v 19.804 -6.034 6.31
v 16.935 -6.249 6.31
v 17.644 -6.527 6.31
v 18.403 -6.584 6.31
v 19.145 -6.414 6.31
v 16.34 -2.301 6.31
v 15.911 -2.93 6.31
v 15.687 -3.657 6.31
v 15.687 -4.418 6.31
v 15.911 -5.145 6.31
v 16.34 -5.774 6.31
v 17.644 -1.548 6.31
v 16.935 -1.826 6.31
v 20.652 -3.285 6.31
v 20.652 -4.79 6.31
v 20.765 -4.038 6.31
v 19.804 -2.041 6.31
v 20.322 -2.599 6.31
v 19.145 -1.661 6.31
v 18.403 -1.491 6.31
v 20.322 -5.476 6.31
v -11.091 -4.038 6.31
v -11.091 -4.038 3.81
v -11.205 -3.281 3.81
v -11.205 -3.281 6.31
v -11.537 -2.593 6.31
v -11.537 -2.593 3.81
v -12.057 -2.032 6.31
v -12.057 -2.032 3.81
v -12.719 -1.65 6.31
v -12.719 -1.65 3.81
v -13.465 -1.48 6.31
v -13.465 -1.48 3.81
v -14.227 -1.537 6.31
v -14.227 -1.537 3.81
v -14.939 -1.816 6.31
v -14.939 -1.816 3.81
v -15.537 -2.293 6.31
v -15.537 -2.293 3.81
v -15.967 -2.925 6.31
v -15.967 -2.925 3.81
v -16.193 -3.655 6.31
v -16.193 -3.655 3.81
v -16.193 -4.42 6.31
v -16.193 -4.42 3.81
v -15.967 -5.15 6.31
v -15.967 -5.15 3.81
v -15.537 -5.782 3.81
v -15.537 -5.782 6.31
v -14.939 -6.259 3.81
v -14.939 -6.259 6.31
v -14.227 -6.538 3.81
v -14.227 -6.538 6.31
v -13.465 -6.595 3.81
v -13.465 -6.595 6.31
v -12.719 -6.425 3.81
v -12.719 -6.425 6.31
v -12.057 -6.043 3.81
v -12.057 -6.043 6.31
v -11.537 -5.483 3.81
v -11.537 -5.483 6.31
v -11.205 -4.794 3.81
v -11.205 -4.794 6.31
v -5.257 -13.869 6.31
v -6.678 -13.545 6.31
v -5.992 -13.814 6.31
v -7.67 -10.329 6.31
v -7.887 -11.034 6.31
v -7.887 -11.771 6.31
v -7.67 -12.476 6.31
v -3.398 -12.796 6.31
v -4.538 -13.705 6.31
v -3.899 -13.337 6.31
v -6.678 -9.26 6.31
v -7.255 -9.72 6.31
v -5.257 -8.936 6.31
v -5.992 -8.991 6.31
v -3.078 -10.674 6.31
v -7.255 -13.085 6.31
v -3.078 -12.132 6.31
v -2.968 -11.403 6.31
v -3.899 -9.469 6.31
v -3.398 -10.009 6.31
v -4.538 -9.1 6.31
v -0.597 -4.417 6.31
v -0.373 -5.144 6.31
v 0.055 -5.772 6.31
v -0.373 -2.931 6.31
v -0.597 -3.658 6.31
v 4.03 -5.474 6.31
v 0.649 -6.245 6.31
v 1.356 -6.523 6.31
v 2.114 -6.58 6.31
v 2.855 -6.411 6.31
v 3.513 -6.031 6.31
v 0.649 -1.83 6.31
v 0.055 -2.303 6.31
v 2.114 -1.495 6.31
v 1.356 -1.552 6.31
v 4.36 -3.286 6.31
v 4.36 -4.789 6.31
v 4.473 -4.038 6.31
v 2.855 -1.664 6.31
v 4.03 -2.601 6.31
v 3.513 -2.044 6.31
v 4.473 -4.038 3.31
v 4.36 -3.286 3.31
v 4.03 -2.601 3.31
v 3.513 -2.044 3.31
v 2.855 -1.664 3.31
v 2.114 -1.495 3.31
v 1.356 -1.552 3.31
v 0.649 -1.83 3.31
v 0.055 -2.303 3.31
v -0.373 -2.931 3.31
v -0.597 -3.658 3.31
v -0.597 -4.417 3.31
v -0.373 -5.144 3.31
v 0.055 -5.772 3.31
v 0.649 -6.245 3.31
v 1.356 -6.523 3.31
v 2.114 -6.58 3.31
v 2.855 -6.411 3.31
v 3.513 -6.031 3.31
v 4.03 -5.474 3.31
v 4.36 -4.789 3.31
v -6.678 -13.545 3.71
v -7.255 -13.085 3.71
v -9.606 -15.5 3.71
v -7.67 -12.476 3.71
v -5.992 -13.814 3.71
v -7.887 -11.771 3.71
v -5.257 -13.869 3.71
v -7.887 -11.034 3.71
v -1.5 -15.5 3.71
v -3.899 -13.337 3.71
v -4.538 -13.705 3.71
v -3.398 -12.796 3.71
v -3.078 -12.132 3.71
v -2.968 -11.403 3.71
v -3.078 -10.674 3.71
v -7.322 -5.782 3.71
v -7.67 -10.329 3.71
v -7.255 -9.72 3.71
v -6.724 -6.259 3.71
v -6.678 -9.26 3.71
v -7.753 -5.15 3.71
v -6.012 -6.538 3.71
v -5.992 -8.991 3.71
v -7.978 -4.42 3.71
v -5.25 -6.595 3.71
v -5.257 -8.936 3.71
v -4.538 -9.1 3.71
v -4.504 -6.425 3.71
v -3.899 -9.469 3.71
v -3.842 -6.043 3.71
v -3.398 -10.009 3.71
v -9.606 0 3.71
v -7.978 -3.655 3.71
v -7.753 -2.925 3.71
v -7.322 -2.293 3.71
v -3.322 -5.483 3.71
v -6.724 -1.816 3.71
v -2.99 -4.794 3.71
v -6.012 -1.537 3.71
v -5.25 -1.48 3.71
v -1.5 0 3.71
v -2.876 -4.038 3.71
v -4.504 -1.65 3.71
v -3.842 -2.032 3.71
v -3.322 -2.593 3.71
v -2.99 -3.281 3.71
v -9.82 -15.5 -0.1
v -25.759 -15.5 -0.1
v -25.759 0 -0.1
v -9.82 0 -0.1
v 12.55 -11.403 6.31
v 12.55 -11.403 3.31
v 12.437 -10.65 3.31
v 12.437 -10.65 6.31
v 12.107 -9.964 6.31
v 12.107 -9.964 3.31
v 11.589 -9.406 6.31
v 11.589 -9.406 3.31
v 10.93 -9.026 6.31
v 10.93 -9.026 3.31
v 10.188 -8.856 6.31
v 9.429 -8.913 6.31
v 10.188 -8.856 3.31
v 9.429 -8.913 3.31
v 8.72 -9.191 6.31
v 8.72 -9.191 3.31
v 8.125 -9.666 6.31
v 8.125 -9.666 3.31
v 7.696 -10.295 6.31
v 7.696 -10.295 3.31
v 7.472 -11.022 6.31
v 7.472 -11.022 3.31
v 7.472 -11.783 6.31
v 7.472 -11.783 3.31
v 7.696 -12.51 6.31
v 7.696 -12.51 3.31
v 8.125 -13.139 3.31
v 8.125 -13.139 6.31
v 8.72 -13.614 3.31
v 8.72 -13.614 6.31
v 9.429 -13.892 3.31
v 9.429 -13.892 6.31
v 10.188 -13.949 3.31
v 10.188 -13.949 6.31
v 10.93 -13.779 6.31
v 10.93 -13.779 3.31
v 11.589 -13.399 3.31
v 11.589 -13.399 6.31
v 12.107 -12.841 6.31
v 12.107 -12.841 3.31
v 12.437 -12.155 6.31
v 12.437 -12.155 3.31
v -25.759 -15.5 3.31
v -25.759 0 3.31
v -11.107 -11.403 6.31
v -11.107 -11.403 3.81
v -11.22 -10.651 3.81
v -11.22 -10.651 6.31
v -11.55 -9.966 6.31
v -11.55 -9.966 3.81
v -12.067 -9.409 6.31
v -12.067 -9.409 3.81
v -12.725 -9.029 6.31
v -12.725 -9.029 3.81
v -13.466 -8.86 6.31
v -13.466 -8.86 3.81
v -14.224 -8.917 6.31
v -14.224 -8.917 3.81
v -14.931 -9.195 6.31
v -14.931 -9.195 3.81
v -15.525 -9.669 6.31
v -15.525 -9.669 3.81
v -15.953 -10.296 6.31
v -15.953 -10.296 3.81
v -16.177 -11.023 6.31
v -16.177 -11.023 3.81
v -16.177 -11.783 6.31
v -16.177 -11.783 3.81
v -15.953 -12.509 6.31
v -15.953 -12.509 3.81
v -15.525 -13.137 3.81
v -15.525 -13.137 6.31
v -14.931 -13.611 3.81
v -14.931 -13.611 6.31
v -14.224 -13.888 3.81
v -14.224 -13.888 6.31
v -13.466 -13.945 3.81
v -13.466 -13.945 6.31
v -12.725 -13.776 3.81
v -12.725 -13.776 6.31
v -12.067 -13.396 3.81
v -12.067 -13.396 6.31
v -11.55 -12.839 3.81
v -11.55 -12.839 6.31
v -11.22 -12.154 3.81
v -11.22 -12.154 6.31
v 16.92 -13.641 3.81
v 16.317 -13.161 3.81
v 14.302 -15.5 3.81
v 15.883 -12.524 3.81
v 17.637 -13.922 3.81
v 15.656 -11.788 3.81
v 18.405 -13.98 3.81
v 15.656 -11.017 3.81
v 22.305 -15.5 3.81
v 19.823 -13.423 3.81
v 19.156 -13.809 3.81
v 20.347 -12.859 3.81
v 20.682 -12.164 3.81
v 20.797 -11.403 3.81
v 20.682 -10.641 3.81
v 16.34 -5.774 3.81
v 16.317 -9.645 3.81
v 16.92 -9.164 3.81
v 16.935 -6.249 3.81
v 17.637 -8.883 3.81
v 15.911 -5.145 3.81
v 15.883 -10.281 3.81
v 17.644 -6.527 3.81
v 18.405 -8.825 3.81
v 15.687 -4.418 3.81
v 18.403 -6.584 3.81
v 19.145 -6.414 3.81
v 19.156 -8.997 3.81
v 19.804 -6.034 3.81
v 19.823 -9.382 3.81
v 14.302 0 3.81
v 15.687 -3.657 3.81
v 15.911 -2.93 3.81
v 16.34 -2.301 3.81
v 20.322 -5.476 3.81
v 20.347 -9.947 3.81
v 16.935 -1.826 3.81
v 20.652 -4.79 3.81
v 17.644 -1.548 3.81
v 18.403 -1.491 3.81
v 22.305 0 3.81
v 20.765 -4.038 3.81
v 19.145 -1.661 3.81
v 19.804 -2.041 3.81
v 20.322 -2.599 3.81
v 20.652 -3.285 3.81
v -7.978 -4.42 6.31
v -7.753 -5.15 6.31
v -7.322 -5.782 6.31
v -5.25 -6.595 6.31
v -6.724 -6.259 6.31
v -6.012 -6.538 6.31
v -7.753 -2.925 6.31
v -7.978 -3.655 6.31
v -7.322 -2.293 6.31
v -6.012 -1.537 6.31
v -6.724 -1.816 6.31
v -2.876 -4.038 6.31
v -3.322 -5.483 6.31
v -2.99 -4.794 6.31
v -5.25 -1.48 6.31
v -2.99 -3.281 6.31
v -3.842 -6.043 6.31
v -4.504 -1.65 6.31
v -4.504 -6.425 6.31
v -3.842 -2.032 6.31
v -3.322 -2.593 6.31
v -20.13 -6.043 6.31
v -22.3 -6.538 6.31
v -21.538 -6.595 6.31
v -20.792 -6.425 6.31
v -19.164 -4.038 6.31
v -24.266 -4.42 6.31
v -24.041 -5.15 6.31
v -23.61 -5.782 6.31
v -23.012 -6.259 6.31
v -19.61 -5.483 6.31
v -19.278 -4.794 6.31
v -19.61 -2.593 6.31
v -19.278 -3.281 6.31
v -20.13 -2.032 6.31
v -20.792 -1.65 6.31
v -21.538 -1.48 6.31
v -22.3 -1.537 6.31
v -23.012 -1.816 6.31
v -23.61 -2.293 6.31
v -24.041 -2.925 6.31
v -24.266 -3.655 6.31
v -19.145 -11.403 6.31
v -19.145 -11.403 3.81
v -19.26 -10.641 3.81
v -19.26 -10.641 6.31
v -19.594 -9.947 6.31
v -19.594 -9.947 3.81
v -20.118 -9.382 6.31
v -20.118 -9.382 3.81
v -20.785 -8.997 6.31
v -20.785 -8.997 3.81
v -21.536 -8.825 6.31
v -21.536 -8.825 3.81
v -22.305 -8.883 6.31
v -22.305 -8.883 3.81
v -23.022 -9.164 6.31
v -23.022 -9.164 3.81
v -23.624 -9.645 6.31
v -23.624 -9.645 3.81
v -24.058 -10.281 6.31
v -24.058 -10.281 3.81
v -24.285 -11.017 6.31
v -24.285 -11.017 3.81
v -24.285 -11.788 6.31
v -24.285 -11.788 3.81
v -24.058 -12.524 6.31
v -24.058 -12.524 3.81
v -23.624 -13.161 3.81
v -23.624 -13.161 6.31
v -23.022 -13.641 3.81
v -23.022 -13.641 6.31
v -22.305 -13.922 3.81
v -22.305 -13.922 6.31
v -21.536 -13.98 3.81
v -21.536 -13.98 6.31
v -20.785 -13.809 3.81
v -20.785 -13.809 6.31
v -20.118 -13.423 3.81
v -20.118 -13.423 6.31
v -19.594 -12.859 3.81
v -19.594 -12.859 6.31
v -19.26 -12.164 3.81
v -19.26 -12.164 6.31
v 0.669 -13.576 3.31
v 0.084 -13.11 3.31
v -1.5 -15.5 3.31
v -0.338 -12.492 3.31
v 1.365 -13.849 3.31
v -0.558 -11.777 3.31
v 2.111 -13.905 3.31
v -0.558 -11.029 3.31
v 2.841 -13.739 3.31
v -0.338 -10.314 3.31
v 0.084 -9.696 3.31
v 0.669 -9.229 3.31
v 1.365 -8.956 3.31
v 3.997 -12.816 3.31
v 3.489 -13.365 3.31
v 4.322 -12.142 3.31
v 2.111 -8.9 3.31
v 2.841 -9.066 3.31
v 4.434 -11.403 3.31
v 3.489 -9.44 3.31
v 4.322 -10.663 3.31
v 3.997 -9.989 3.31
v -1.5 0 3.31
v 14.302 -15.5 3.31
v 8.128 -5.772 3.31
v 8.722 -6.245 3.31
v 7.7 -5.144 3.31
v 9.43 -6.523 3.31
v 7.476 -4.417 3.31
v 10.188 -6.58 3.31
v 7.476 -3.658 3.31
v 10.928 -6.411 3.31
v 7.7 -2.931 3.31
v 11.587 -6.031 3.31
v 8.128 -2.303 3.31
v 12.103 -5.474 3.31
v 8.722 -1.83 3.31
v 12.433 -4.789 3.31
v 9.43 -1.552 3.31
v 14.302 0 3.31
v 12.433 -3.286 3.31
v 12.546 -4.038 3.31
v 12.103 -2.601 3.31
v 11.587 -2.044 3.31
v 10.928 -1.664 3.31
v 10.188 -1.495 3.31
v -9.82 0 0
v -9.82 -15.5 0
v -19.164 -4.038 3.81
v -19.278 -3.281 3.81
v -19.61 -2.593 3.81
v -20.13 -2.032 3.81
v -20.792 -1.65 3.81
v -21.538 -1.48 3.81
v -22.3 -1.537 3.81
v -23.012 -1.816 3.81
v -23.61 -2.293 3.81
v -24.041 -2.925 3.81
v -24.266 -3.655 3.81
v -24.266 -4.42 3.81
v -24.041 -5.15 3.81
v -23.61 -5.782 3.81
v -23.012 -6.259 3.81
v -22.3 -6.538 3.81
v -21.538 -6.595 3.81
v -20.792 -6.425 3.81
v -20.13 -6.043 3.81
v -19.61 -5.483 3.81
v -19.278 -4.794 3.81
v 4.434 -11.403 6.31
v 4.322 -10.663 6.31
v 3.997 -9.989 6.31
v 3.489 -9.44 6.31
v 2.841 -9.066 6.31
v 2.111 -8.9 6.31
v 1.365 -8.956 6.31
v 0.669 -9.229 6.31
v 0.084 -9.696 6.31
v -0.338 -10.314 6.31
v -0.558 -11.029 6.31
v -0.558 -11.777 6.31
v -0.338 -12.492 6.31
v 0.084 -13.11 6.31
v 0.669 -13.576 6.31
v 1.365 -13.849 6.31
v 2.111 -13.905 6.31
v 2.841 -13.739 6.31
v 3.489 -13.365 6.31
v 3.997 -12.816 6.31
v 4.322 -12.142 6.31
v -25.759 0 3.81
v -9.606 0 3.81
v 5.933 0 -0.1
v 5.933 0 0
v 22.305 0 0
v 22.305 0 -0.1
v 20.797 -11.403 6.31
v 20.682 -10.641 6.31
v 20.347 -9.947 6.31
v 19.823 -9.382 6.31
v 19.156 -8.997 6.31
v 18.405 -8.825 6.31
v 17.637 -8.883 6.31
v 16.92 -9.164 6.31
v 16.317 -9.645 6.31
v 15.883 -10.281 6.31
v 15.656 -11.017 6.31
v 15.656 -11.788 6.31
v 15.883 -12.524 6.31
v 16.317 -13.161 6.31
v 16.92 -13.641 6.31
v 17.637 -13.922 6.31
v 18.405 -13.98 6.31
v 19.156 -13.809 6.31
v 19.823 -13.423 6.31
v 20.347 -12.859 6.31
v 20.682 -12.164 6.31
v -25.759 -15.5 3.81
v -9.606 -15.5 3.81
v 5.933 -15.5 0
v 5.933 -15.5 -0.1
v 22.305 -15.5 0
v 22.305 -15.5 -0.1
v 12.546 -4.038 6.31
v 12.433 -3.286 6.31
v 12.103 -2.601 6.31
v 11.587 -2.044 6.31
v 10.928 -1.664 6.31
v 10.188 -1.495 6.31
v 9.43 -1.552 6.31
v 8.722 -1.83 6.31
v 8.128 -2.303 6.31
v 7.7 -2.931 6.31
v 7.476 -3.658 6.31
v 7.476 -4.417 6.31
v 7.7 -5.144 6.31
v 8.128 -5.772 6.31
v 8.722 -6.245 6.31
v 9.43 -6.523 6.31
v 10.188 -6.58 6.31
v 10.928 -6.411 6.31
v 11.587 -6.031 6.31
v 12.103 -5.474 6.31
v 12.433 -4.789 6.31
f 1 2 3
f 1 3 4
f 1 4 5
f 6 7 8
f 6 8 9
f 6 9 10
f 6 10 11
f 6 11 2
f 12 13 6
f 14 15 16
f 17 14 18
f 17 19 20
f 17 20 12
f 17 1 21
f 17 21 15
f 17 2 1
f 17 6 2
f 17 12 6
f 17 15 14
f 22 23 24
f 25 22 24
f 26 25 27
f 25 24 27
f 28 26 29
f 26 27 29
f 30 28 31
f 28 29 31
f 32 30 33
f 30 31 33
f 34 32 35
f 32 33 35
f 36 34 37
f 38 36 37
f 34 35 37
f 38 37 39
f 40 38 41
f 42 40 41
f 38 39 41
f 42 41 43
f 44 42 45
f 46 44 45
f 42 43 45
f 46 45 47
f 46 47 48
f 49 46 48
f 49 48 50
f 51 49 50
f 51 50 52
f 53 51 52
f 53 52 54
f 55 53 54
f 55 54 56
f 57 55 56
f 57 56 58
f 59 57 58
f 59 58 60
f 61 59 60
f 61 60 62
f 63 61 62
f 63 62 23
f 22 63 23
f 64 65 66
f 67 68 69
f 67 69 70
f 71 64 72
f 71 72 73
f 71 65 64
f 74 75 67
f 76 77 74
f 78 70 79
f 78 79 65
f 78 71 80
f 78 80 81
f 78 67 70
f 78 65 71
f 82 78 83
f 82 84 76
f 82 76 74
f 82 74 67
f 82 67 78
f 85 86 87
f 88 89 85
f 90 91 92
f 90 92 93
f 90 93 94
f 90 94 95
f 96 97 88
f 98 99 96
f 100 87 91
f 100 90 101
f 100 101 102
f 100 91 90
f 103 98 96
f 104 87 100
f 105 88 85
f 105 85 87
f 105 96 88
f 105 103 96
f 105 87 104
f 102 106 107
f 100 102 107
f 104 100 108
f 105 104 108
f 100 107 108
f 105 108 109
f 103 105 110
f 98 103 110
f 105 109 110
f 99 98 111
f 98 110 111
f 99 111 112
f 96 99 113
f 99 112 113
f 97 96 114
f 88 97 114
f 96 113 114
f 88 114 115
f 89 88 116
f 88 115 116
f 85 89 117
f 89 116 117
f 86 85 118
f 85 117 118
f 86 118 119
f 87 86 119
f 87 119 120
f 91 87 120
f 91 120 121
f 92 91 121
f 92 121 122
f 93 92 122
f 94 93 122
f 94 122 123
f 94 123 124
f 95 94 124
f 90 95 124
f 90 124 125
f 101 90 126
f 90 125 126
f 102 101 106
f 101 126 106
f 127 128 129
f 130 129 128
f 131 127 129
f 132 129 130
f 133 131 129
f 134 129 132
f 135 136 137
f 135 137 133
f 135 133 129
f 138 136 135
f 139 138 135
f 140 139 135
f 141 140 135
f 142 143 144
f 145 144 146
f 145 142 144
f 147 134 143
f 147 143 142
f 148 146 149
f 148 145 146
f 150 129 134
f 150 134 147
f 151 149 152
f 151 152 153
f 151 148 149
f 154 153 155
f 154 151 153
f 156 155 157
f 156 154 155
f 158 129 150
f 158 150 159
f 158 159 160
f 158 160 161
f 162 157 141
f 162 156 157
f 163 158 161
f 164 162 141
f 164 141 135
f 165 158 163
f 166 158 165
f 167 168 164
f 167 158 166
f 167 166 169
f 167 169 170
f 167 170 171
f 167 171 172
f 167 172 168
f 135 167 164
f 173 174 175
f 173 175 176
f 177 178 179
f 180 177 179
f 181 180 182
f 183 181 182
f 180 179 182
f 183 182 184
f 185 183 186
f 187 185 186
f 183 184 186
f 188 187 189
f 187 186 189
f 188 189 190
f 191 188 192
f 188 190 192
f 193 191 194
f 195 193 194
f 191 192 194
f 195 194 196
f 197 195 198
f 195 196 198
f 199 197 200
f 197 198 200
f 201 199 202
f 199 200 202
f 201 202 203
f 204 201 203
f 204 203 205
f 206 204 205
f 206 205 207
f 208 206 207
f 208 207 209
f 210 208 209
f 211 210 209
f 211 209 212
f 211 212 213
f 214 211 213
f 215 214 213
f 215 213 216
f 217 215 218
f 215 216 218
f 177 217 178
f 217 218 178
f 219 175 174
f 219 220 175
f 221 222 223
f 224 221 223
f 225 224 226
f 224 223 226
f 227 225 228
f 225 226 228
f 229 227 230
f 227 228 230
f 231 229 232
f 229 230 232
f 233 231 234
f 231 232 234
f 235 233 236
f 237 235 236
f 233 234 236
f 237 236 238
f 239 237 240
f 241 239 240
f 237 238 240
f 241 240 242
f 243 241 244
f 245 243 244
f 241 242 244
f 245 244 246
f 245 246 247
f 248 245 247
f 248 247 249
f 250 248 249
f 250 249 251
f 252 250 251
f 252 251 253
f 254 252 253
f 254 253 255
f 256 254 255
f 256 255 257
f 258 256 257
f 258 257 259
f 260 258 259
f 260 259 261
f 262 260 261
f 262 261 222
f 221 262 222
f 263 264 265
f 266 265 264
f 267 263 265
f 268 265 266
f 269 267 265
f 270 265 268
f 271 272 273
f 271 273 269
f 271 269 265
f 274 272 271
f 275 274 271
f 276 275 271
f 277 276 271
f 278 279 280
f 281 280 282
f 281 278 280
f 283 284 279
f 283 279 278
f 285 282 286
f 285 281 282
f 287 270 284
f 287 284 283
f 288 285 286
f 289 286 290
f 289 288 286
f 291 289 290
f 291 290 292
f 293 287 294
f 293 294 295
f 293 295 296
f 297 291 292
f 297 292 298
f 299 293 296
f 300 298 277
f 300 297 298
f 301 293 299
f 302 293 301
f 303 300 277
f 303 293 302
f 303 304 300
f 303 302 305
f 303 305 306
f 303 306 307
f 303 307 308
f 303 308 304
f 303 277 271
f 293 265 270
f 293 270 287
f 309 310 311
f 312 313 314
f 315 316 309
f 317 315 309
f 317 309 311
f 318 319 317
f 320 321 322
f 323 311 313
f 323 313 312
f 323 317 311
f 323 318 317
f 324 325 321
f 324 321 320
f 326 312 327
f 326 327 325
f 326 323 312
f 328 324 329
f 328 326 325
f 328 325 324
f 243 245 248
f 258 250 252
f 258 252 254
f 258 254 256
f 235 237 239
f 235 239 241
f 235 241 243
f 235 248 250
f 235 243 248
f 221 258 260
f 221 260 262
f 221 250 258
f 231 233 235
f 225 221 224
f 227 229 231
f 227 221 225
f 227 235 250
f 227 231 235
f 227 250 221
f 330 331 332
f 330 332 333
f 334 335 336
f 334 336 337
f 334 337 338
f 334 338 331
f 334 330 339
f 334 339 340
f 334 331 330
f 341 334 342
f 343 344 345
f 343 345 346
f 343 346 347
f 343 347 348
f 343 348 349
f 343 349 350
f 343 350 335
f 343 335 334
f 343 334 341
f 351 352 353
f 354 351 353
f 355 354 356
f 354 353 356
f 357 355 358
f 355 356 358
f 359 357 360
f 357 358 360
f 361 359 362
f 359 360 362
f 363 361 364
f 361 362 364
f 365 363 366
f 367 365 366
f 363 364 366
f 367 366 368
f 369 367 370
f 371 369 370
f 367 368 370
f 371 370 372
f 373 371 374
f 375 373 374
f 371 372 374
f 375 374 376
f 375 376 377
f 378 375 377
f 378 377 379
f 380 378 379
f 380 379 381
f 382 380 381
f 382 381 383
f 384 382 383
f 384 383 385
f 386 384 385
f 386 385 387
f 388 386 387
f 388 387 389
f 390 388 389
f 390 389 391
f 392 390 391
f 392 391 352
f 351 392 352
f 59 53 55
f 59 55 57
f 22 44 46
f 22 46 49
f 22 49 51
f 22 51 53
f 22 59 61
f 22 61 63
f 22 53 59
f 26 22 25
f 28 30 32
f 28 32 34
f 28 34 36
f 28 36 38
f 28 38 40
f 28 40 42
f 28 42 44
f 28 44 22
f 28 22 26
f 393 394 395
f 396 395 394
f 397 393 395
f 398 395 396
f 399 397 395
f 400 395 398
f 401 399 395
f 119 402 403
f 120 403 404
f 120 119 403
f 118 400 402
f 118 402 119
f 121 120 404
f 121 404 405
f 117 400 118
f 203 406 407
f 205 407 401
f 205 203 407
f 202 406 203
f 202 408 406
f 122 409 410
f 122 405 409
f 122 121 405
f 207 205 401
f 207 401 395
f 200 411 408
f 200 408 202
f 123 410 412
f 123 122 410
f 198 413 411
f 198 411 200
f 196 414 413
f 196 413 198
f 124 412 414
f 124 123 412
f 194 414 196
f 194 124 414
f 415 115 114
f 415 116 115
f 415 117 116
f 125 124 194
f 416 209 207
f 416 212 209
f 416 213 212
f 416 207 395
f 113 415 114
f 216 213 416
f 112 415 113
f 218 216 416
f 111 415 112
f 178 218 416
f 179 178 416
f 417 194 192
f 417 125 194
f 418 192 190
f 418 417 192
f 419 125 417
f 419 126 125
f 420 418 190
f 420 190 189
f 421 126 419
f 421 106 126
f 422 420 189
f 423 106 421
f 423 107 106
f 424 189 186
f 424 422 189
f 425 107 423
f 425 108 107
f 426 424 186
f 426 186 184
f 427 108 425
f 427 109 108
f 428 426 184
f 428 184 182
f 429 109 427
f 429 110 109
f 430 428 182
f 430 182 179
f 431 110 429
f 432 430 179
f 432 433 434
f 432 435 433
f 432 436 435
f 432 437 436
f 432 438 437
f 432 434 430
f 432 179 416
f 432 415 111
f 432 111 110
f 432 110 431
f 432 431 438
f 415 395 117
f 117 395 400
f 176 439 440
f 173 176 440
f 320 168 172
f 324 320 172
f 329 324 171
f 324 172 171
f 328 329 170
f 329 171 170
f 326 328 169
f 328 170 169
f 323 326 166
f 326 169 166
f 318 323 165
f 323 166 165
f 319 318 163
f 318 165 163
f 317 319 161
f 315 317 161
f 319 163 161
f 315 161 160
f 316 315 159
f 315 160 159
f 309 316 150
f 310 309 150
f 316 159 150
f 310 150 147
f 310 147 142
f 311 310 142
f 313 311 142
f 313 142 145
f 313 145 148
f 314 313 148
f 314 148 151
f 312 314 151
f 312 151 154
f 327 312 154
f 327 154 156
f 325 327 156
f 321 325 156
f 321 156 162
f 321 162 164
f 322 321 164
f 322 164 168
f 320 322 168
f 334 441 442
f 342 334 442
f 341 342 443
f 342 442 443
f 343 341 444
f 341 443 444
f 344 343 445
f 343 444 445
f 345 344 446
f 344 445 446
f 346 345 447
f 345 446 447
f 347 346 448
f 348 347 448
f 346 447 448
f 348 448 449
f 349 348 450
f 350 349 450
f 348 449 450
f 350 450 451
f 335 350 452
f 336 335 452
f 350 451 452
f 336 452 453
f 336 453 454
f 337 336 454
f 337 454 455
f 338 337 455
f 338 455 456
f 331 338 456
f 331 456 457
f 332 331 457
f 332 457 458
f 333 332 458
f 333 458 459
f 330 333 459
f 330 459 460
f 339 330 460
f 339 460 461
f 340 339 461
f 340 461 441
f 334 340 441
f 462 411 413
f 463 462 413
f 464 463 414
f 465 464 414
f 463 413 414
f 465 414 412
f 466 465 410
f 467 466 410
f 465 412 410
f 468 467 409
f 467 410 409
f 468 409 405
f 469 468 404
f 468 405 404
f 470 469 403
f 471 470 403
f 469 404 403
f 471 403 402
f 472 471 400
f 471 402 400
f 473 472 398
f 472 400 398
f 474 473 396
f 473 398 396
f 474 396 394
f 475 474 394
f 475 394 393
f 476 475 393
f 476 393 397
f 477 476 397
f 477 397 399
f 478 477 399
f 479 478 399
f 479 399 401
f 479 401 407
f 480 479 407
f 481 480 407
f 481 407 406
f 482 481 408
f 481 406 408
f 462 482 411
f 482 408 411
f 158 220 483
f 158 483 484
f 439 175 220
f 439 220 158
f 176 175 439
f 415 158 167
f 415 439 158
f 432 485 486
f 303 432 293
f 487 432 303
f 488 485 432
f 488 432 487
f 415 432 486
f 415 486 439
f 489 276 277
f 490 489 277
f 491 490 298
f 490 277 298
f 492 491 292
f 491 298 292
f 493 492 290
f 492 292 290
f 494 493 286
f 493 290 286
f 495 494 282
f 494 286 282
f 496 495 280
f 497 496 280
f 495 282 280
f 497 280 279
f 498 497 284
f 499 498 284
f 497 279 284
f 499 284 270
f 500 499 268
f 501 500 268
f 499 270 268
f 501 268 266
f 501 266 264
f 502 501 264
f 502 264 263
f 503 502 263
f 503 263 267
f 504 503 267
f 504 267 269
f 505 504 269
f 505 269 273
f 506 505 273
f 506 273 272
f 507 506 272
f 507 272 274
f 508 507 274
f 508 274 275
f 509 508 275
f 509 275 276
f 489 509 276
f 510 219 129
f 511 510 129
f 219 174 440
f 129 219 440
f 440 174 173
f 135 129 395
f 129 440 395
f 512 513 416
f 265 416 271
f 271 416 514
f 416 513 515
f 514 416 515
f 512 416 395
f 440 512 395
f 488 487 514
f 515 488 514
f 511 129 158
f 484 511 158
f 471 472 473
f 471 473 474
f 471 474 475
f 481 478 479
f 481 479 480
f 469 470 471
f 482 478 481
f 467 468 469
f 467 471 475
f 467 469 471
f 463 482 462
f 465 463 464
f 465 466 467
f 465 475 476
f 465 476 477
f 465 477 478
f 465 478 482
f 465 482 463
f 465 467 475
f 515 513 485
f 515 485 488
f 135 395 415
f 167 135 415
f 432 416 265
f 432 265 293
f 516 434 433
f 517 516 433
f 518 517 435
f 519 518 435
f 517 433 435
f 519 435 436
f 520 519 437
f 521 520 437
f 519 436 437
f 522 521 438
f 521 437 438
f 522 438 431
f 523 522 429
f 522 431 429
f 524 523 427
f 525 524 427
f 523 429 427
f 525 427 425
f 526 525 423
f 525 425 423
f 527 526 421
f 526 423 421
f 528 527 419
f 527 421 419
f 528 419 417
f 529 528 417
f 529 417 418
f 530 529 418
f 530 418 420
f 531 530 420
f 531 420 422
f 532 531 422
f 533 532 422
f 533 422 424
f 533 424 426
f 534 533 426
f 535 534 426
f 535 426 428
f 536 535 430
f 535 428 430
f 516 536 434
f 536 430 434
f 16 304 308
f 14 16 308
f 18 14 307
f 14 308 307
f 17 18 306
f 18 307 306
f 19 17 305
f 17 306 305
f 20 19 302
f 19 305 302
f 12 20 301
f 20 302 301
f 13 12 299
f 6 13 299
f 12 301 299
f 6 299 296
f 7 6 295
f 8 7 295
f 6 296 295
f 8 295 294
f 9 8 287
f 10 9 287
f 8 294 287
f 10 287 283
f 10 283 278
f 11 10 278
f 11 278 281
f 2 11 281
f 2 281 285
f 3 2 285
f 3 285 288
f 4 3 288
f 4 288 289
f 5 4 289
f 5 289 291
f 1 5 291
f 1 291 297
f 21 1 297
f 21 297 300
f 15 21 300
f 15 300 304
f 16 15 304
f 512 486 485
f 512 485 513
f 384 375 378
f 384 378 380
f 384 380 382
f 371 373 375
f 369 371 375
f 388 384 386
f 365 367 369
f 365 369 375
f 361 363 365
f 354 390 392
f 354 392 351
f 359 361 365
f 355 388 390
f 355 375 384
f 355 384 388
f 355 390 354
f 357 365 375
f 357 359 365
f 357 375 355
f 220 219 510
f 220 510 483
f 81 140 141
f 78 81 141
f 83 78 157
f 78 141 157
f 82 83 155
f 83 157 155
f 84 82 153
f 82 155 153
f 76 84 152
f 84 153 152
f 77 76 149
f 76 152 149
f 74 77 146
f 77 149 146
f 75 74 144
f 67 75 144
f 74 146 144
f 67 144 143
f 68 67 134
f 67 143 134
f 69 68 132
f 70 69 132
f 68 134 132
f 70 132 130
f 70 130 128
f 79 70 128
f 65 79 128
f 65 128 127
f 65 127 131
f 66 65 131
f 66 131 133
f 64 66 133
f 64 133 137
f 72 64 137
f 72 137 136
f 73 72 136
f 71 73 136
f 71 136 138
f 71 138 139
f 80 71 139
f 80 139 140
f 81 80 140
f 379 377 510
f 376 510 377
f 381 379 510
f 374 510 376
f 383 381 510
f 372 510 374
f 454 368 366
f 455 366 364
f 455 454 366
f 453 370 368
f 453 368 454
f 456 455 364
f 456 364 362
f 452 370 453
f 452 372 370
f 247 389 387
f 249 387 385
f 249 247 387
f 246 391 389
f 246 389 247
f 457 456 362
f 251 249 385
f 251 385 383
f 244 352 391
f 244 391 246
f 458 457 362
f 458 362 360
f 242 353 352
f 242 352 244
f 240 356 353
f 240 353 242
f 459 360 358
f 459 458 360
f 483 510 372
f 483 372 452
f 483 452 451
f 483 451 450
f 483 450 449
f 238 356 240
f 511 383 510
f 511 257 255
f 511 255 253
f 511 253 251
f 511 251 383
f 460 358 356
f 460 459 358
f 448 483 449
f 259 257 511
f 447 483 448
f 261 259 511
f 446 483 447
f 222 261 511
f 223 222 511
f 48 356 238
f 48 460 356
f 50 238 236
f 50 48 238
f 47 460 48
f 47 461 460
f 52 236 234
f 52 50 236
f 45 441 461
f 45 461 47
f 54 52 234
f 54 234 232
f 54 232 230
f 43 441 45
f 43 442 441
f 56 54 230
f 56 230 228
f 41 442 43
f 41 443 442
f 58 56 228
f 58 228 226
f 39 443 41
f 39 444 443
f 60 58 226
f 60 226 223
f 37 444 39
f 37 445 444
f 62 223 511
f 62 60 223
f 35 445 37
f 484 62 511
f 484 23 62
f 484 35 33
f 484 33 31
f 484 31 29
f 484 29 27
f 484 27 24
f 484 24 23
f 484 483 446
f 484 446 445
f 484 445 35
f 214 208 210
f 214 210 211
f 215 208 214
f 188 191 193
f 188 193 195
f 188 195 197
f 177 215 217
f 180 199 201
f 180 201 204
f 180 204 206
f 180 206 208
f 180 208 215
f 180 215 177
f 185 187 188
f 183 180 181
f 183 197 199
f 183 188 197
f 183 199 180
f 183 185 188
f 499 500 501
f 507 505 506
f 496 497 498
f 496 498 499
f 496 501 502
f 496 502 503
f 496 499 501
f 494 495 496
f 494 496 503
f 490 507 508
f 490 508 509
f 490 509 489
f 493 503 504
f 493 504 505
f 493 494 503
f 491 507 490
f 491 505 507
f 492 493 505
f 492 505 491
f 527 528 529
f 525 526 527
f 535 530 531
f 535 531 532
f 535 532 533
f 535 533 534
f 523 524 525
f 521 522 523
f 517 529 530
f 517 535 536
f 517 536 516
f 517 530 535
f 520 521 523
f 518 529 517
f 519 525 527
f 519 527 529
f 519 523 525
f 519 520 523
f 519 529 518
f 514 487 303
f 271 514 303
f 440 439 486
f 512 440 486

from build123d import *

# Parameters (mm, degrees)
F0_W     = 48.063562
F0_H     = 3.309766
F1_DEPTH = 15.5
F2_R     = 2.565149
F2_R_2   = 2.584627
F2_R_3   = 2.54946
F2_R_4   = 2.565151
F2_R_5   = 2.47358
F2_R_6   = 2.509808
F2_R_7   = 2.553392
F2_R_8   = 2.553391
F3_DEPTH = 3
F4_W     = 16.371909
F4_H     = 15.5
F4_W_2   = 15.93889
F5_DEPTH = 0.1
F6_W     = 16.152791
F6_H     = 15.5
F6_W_2   = 8.003426
F7_DEPTH = 0.5
F8_W     = 8.105978
F8_H     = 15.5
F9_DEPTH = 0.4


with BuildPart() as f1:
    # F0 (on Front) → F1 (new body)
    with BuildSketch(Plane.XZ):
        with Locations((-1.726834, 1.654883)):
            Rectangle(F0_W, F0_H)
    extrude(amount=F1_DEPTH)

    # F2 (on face) → F3 (join)
    with BuildSketch(Plane.XY.offset(3.309766)):
        with Locations((-21.72962, -4.037504)):
            Circle(F2_R)
        with Locations((-21.72962, -11.402613)):
            Circle(F2_R_2)
        with Locations((-13.656328, -11.402613)):
            Circle(F2_R_3)
        with Locations((-13.656328, -4.037504)):
            Circle(F2_R)
        with Locations((-5.441401, -4.037504)):
            Circle(F2_R_4)
        with Locations((-5.441401, -11.402613)):
            Circle(F2_R_5)
        with Locations((1.923707, -11.402613)):
            Circle(F2_R_6)
        with Locations((1.923707, -4.037504)):
            Circle(F2_R_3)
        with Locations((9.997, -4.037504)):
            Circle(F2_R_3)
        with Locations((9.997, -11.402613)):
            Circle(F2_R_7)
        with Locations((18.211929, -11.402613)):
            Circle(F2_R_2)
        with Locations((18.211929, -4.037504)):
            Circle(F2_R_8)
    extrude(amount=F3_DEPTH)

    # F4 (on face) → F5 (join)
    with BuildSketch(Plane(origin=(0, 0, 0), x_dir=(1, 0, 0), z_dir=(0, 0, -1))):
        with Locations((14.118992, 7.75)):
            Rectangle(F4_W, F4_H)
        with Locations((-17.78917, 7.75)):
            Rectangle(F4_W_2, F4_H)
    extrude(amount=F5_DEPTH)

    # F6 (on face) → F7 (join)
    with BuildSketch(Plane.XY.offset(3.309766)):
        with Locations((-17.682219, -7.75)):
            Rectangle(F6_W, F6_H)
        with Locations((18.303234, -7.75)):
            Rectangle(F6_W_2, F6_H)
    extrude(amount=F7_DEPTH)

    # F8 (on face) → F9 (join)
    with BuildSketch(Plane.XY.offset(3.309766)):
        with Locations((-5.552835, -7.75)):
            Rectangle(F8_W, F8_H)
    extrude(amount=F9_DEPTH)


solid = f1.part
